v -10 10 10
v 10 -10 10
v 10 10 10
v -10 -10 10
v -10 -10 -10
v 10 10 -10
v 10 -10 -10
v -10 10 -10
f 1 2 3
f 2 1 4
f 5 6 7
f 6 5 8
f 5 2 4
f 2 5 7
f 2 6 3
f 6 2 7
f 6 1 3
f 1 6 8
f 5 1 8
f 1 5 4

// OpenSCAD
// Benchmark model: trivial solid. Measures the fixed per-render overhead
// (WASM instance start-up, font mounting, viewer load) with ~no geometry.
cube([20, 20, 20], center = true);
